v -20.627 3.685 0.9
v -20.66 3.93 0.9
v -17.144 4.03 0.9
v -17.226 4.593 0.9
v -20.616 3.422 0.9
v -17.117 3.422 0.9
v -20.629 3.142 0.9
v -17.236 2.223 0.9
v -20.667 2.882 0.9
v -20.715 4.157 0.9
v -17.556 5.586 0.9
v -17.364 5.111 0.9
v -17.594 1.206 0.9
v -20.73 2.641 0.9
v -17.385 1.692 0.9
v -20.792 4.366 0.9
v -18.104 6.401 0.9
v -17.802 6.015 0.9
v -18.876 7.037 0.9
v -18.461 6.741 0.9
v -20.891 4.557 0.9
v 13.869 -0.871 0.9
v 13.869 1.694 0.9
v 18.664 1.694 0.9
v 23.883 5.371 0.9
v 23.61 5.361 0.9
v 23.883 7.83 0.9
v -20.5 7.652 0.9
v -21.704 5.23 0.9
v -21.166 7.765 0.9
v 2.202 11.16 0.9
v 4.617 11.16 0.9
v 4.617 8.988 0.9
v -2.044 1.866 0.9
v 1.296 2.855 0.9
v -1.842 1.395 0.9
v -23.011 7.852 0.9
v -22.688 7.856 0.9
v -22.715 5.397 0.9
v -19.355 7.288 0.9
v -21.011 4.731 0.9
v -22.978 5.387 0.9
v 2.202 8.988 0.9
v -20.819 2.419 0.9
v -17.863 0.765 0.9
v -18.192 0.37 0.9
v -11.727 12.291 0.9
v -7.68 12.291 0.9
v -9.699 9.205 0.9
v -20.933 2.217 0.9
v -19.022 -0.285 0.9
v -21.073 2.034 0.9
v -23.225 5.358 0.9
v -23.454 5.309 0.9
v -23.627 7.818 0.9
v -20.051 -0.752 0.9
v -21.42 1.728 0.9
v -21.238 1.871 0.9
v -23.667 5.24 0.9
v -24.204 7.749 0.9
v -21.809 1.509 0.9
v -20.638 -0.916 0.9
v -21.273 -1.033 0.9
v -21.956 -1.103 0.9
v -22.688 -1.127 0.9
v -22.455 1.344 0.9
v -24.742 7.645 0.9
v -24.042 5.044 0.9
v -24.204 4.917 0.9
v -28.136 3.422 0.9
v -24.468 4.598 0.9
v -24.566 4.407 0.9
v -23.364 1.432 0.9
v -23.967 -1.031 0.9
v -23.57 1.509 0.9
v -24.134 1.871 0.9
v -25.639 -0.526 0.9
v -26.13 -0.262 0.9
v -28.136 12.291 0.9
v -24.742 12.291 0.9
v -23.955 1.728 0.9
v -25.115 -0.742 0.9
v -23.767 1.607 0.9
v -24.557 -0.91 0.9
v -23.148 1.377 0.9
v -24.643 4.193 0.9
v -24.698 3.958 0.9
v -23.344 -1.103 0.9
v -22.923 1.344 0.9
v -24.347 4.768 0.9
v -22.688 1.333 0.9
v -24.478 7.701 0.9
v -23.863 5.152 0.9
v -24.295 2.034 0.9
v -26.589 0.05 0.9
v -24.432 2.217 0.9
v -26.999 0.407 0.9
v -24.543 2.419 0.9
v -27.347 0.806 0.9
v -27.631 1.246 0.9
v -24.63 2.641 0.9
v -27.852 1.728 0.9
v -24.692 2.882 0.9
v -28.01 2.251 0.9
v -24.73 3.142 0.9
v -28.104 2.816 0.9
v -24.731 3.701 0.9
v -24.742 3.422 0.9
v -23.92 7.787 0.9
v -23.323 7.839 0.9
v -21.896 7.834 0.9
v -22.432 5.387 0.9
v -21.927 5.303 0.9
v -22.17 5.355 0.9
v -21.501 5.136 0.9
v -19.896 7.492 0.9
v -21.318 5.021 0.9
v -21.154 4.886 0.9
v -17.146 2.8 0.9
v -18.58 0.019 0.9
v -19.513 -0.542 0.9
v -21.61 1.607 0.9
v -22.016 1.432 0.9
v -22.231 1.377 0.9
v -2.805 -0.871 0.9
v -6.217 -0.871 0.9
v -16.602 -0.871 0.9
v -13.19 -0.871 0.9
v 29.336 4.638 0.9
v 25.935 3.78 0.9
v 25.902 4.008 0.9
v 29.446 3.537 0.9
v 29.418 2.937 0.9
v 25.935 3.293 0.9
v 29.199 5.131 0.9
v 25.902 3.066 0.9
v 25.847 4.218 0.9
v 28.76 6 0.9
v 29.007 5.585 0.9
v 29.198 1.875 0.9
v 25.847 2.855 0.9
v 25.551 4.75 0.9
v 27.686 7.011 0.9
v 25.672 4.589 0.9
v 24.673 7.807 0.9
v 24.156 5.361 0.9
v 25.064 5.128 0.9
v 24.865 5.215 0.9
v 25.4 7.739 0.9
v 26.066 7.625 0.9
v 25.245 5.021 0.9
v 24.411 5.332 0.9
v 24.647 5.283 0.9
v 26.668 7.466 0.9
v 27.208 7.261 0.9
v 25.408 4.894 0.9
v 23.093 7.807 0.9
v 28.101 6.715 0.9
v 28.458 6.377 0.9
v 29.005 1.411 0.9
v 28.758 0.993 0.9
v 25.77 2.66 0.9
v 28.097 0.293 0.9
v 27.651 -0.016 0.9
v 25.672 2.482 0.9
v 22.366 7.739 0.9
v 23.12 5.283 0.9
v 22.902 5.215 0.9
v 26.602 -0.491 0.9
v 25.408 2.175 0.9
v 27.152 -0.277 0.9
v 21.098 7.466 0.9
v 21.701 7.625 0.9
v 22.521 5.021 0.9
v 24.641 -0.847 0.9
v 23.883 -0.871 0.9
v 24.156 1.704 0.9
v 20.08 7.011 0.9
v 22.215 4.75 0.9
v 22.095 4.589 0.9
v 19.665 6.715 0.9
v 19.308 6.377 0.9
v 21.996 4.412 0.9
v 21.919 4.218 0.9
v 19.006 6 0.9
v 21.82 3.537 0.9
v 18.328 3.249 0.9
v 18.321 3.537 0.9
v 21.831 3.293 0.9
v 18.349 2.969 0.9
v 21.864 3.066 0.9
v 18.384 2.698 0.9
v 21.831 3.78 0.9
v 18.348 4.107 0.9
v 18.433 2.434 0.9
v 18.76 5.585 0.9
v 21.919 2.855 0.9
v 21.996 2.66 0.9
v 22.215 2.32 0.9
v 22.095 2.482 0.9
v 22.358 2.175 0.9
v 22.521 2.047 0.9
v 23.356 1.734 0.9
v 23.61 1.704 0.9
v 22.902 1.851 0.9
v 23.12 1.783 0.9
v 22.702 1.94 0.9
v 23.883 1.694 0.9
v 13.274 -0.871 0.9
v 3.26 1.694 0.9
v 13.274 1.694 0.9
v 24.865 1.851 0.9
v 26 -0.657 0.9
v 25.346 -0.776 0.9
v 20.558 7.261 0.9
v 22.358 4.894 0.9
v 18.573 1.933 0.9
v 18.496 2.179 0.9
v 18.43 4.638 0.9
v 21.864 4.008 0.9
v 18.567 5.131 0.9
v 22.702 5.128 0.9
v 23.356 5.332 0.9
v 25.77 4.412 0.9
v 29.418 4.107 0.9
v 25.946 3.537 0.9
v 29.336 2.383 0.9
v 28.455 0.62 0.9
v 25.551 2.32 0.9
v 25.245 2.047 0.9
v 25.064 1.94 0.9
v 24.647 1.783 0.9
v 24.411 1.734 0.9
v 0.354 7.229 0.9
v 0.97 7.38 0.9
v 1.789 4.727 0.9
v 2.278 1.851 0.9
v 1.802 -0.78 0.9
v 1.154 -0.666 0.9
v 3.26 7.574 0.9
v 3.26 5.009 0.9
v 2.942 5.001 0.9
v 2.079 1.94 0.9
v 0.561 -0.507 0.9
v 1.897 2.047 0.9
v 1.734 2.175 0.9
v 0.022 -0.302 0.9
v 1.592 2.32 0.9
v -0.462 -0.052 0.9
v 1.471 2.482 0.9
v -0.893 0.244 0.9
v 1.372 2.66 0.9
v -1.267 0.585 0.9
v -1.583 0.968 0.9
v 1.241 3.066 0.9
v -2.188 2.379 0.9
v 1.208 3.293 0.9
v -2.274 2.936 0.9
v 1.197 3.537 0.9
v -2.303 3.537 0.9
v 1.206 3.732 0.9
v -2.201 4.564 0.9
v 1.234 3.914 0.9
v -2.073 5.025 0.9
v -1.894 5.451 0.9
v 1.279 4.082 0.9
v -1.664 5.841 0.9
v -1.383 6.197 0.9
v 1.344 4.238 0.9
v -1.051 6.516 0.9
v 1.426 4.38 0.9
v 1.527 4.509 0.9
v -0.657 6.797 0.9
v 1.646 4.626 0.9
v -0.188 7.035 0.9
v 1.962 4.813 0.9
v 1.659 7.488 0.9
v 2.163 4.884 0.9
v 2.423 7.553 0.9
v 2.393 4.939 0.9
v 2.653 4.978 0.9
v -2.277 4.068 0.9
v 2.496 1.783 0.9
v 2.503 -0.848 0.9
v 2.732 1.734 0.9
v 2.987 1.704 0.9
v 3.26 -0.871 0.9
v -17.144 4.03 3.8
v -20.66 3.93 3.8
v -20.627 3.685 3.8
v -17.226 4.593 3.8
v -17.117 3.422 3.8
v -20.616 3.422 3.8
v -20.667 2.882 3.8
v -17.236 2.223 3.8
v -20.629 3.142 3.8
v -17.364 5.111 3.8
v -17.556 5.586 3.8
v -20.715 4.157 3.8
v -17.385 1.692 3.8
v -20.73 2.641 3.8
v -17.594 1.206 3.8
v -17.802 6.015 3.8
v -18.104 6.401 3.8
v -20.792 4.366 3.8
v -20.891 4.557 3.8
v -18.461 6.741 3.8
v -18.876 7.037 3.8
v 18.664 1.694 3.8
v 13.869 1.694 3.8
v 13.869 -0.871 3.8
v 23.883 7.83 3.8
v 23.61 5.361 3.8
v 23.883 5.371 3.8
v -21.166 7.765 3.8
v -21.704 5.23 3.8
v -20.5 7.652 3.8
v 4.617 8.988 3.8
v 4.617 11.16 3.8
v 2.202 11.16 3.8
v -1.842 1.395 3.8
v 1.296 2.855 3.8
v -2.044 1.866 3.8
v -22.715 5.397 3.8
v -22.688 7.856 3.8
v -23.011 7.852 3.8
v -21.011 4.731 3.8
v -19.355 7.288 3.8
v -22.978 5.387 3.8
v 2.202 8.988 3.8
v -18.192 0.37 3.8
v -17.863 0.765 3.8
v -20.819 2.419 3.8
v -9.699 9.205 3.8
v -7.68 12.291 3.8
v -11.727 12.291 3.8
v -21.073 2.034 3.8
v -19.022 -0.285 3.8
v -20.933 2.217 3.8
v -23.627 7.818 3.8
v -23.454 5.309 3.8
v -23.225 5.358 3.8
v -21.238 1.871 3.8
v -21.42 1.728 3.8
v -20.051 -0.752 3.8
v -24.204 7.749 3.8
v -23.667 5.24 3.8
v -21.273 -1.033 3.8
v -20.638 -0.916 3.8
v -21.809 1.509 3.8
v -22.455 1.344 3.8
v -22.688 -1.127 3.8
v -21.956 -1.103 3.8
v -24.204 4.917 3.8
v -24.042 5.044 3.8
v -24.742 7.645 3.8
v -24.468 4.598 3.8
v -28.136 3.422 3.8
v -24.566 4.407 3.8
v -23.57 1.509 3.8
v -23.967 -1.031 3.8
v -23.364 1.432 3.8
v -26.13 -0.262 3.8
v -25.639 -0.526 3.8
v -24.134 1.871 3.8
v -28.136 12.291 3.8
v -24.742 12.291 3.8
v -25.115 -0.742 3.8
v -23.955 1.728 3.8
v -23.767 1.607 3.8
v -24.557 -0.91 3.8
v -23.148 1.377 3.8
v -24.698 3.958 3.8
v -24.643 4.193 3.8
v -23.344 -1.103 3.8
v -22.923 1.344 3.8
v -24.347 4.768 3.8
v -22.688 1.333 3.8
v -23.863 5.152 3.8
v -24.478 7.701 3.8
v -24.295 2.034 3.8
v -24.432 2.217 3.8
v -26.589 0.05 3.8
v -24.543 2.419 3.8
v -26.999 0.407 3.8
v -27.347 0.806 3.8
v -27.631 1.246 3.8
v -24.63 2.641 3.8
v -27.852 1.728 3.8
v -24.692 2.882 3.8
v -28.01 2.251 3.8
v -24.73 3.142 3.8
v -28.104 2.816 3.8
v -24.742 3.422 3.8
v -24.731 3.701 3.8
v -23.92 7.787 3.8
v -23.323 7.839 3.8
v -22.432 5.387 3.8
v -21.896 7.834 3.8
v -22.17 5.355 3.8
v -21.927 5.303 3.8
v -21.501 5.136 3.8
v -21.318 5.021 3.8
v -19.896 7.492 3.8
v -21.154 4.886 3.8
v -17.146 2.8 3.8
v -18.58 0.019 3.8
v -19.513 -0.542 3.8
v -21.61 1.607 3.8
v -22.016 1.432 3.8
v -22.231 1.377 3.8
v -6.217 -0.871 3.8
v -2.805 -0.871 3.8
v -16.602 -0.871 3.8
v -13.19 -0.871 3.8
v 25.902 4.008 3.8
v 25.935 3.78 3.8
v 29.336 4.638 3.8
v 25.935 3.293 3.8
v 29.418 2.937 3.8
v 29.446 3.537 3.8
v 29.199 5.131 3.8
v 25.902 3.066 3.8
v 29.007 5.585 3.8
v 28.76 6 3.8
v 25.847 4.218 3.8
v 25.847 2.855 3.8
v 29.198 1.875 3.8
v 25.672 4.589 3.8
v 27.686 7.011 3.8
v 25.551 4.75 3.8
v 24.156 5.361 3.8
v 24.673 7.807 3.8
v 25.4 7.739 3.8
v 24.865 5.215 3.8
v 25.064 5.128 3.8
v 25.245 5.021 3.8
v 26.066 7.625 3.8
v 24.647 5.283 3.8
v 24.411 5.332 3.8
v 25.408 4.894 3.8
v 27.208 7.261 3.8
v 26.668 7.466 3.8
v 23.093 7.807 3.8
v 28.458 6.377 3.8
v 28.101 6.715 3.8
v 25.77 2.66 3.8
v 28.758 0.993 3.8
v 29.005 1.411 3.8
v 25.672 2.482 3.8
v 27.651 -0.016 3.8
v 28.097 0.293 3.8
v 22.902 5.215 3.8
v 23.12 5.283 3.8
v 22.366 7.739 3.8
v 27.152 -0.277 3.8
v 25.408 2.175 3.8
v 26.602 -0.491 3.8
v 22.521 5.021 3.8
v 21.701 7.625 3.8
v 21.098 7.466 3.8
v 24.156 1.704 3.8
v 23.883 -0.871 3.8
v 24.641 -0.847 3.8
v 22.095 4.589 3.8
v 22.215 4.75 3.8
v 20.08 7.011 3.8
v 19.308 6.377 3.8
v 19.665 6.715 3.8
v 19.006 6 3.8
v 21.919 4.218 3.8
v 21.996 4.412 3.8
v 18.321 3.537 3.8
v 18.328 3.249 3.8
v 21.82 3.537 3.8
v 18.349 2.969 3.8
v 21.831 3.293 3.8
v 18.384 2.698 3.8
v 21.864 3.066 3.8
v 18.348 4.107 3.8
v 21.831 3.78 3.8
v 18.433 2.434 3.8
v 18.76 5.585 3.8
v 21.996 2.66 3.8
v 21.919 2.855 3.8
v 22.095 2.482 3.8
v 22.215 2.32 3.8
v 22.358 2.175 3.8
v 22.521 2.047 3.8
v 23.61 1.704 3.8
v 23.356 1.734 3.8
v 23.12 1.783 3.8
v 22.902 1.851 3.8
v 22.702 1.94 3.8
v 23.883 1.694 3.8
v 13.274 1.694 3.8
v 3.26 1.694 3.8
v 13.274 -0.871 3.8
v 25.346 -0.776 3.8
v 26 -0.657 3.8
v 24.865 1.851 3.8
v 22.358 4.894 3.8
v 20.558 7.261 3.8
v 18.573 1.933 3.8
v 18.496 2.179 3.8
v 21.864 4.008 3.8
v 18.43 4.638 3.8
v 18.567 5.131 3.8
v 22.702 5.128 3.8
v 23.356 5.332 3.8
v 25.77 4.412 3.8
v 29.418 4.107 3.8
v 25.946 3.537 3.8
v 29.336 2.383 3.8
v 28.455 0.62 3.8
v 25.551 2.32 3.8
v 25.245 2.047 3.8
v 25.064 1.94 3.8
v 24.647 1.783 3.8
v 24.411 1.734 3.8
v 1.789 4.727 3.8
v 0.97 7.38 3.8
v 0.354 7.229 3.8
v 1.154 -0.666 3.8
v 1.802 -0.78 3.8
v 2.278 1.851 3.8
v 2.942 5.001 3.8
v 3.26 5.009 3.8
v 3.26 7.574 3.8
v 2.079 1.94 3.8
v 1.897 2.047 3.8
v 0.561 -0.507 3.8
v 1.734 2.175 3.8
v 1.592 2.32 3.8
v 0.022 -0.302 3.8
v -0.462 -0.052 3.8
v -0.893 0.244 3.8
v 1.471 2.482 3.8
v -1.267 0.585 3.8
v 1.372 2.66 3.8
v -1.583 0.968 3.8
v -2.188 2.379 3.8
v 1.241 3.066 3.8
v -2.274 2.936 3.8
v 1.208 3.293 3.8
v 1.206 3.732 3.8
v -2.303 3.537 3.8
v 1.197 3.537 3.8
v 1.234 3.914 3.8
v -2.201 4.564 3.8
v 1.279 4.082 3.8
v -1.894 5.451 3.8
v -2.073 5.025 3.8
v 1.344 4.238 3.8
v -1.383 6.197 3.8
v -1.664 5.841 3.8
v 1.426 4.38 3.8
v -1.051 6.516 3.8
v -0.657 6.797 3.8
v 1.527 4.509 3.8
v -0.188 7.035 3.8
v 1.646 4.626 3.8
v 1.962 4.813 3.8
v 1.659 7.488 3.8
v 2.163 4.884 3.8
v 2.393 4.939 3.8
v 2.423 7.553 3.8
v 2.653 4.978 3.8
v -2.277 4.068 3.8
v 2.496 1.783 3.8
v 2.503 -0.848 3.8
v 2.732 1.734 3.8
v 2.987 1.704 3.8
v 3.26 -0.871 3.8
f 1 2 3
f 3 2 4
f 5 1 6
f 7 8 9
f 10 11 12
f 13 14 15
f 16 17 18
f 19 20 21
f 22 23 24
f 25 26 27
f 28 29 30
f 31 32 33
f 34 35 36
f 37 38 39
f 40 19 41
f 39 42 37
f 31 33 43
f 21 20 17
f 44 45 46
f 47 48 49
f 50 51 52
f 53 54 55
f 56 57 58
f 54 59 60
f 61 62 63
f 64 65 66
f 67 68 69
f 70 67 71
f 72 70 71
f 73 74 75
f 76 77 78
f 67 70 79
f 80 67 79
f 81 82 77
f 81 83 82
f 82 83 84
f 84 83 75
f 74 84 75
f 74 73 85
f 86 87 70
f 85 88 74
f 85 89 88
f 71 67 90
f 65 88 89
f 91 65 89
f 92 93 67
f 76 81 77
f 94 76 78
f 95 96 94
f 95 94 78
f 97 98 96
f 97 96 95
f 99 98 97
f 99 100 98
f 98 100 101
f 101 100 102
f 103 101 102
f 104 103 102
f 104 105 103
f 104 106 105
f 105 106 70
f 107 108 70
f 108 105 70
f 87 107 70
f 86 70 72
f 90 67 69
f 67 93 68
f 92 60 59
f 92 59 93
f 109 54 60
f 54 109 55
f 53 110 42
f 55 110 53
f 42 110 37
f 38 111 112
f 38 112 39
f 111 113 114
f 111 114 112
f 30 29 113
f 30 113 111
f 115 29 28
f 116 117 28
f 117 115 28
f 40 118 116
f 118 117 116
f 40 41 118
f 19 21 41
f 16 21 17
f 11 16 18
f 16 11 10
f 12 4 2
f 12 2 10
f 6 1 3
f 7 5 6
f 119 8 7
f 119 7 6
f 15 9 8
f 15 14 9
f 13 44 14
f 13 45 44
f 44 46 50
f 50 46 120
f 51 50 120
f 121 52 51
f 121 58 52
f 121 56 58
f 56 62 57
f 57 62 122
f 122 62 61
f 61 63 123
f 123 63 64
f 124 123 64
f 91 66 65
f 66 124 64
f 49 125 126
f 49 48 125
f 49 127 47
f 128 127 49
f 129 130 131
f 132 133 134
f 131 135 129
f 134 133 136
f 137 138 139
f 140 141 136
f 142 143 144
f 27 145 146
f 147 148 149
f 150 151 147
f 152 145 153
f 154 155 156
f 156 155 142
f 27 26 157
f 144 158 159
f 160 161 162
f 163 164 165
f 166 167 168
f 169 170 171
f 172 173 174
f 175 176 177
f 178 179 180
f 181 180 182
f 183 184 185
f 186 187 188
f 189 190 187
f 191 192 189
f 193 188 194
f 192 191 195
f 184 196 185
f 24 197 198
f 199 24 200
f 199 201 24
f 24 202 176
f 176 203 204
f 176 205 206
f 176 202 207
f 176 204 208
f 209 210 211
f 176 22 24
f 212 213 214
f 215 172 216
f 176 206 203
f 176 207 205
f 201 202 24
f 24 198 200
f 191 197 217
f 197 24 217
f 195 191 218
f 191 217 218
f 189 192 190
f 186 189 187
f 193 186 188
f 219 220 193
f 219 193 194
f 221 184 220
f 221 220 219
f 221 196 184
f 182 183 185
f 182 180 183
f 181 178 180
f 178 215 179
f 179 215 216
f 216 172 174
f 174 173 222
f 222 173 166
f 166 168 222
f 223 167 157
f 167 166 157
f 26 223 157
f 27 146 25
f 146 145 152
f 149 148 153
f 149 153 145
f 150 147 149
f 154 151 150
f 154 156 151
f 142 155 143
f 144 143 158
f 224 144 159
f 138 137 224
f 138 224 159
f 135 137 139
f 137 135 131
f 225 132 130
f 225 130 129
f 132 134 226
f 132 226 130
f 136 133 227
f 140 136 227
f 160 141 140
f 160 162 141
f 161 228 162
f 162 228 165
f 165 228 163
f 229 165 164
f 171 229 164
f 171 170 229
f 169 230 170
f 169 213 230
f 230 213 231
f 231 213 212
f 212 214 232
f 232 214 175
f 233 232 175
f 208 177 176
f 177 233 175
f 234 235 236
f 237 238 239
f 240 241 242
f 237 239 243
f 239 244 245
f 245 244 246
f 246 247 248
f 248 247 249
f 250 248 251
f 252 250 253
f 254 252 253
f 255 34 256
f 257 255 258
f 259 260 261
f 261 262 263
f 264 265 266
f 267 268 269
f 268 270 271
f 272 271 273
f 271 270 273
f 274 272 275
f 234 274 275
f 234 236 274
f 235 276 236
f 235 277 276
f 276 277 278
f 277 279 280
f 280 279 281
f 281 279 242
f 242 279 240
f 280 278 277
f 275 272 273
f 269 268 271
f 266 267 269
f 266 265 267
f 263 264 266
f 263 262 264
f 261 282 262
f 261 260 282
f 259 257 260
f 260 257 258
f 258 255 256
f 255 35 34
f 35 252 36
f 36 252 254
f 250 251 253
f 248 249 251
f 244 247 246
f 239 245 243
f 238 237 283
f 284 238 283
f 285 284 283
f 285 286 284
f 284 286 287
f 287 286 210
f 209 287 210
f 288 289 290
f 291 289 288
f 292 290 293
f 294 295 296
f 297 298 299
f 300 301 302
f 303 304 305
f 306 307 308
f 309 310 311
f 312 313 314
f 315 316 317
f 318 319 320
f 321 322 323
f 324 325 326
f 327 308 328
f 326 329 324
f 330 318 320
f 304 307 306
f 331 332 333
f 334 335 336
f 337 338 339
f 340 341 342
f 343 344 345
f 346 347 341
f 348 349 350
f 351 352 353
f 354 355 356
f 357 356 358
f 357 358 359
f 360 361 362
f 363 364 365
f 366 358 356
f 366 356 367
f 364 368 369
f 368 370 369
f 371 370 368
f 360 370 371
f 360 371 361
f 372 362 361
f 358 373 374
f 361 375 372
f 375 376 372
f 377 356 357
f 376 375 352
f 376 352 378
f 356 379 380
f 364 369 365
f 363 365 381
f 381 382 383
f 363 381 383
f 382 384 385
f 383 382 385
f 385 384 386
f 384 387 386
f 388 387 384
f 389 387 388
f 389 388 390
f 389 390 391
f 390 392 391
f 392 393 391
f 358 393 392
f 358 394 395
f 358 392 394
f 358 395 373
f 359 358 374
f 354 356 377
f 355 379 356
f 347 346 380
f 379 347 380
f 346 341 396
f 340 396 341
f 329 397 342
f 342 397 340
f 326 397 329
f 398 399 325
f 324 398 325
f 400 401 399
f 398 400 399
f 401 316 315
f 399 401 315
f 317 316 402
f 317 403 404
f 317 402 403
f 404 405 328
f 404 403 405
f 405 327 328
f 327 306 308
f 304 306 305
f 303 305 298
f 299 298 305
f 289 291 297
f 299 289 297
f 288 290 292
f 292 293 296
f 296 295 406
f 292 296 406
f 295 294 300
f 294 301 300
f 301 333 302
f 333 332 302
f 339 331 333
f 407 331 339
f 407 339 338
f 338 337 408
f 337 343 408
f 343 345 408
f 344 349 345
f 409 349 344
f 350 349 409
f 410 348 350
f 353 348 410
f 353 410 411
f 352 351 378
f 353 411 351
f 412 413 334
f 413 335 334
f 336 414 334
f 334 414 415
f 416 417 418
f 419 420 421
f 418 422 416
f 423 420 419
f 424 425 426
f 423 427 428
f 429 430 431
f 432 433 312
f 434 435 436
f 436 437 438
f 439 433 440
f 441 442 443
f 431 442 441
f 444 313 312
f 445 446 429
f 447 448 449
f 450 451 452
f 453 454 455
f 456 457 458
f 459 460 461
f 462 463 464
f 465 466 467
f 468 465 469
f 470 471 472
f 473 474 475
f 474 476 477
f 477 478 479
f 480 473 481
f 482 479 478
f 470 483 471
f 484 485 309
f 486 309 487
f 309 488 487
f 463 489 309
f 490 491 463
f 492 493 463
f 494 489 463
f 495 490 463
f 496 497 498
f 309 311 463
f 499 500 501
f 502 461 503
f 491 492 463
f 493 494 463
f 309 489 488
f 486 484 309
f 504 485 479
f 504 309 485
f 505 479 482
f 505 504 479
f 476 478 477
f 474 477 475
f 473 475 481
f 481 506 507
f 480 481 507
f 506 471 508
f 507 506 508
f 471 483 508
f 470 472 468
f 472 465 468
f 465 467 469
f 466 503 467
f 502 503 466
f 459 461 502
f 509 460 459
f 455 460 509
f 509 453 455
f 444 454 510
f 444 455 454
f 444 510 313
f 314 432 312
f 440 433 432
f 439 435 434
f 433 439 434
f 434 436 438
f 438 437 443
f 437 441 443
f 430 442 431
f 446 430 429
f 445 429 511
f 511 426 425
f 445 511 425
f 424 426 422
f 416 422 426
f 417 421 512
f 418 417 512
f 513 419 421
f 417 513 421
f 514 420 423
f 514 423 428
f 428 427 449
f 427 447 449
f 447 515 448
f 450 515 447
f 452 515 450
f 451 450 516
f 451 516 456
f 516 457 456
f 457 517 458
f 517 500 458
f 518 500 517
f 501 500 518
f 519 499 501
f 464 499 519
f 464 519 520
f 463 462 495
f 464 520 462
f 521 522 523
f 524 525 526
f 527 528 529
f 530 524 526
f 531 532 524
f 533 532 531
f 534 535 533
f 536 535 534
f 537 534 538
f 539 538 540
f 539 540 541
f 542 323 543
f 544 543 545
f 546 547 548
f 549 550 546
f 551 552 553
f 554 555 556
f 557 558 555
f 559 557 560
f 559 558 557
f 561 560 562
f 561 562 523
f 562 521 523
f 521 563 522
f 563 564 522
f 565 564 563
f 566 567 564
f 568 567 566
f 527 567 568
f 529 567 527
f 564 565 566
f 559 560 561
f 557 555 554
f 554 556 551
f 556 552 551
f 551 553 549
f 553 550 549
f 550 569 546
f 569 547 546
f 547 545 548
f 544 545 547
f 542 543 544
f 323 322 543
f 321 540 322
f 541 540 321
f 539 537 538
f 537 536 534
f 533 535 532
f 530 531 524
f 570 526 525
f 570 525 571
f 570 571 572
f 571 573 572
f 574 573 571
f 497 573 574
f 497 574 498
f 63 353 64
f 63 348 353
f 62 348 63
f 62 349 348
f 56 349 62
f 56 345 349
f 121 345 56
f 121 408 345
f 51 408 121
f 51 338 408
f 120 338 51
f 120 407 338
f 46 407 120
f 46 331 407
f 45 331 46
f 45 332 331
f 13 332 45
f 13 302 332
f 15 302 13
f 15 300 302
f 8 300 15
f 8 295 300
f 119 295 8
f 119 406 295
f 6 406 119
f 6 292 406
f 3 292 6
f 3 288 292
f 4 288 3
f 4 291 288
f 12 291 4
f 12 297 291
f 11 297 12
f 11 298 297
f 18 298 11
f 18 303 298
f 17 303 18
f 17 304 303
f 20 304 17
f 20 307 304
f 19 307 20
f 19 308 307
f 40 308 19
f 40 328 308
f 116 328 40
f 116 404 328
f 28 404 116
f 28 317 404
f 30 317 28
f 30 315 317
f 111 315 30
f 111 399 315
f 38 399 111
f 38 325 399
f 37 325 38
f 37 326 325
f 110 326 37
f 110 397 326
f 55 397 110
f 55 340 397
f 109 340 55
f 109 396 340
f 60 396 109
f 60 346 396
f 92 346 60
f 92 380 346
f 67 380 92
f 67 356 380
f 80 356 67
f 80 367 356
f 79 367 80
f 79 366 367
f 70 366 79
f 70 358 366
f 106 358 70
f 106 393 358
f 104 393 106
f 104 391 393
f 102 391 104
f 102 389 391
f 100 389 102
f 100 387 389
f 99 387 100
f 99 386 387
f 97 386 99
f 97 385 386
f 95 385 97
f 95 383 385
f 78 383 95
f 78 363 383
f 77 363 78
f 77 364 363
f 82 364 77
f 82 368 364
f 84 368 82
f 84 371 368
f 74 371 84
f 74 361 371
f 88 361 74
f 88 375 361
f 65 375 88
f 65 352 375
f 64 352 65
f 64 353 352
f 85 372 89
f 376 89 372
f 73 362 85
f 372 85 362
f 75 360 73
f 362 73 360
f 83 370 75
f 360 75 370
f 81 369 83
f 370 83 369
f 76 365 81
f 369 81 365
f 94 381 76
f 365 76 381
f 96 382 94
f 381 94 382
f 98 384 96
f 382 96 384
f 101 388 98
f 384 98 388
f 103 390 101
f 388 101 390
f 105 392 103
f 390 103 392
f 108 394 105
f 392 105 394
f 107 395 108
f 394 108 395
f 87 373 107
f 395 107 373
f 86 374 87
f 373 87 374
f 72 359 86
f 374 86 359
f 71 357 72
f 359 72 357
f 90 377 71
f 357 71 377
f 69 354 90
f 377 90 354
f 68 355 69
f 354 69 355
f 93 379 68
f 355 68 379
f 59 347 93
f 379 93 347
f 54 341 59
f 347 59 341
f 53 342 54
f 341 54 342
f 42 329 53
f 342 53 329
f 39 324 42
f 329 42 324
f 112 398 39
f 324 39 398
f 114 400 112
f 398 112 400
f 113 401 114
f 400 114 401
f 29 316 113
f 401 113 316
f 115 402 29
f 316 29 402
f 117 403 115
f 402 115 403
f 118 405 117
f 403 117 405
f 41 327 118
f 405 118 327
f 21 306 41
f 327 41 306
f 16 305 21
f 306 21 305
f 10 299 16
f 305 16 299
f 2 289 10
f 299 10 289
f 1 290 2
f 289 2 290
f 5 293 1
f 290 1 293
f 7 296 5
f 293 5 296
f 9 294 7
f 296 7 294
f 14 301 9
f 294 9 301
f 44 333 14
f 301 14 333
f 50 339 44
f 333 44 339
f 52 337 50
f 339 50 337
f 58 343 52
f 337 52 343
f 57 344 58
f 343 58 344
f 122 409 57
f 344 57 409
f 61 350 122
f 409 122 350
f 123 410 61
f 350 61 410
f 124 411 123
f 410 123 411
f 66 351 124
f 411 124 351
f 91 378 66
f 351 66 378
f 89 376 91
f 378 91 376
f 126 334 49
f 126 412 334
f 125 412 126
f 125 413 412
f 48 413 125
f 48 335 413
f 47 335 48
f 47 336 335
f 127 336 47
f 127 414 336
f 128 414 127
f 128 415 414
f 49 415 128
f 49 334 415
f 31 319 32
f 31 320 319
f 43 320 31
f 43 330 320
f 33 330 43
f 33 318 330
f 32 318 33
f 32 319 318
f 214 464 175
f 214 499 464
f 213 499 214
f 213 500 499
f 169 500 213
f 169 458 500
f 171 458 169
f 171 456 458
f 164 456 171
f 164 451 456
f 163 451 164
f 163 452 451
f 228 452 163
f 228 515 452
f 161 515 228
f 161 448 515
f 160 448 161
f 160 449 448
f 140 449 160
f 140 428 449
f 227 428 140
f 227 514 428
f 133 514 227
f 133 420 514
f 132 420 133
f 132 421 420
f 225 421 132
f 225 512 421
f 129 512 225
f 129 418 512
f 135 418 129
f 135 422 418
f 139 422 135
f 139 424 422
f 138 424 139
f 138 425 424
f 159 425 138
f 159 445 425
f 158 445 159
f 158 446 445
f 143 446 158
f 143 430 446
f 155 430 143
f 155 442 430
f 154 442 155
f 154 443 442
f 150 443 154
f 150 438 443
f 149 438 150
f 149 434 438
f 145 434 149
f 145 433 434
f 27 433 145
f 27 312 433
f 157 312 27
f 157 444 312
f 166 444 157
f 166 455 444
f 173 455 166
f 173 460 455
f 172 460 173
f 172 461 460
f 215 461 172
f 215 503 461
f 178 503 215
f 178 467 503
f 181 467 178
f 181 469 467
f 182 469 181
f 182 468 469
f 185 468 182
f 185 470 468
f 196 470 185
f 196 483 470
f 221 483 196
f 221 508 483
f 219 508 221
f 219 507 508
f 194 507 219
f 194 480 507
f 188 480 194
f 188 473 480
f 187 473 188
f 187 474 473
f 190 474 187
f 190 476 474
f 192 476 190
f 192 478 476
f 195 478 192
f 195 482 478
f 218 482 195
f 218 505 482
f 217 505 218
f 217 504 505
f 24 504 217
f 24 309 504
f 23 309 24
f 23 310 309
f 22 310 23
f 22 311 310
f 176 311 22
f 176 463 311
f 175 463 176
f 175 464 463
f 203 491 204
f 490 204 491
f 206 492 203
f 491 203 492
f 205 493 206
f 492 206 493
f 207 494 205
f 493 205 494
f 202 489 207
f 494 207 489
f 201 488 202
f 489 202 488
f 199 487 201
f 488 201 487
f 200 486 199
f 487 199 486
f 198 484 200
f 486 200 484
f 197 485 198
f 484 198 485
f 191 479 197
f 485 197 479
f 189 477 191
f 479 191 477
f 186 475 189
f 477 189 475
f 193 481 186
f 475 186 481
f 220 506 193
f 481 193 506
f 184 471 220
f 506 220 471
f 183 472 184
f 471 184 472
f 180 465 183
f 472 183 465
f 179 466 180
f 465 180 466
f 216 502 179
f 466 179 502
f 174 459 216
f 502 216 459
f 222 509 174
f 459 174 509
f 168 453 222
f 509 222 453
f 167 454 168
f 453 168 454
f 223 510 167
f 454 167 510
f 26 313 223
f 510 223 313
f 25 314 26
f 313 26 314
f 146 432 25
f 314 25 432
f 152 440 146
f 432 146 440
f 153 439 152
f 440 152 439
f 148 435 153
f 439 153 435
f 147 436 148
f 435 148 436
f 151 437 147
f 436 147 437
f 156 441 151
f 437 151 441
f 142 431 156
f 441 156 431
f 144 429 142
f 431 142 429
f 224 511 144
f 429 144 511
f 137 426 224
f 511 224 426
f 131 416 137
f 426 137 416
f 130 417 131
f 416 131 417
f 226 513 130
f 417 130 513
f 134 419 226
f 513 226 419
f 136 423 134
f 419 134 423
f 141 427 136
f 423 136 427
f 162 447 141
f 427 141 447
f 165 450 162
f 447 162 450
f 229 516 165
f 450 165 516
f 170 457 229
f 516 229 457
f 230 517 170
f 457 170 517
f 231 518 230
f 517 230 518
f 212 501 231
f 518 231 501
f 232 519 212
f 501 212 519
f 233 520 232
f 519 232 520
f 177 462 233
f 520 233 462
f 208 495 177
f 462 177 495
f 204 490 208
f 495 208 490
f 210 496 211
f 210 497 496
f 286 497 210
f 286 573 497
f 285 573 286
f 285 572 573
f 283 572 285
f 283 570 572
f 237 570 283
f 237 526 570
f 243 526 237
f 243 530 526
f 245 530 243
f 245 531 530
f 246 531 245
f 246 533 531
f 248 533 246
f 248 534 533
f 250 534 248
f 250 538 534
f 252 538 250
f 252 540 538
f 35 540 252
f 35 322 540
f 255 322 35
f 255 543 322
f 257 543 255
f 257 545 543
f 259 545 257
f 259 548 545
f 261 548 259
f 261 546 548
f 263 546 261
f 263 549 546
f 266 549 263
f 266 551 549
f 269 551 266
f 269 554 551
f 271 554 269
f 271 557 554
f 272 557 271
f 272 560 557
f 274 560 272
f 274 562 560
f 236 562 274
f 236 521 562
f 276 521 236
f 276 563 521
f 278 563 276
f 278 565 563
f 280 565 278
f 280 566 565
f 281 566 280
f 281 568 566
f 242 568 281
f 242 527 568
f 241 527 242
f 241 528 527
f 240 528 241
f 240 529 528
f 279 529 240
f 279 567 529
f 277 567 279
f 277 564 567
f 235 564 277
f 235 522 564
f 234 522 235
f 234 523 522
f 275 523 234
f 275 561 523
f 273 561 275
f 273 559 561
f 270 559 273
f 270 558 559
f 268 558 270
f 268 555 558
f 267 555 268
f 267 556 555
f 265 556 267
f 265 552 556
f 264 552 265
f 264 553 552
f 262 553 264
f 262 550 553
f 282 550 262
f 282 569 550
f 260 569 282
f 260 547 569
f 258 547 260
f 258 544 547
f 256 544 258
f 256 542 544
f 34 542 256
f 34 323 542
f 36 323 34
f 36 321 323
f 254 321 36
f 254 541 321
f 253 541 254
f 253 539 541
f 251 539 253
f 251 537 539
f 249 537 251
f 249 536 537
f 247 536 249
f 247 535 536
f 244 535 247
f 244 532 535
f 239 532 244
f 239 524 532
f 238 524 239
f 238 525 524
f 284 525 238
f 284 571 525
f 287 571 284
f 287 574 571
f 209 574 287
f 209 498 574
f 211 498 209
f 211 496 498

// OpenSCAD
$fn = 48;
  // syllabics (overlaid on icon, tallest) — row 1
  translate([0, 5.430, 0.900]) linear_extrude(height=2.900) text("ᑲᐱᓛᓄ", size=13.000, halign="center", valign="center", font="Euphemia UCAS:style=Bold");
